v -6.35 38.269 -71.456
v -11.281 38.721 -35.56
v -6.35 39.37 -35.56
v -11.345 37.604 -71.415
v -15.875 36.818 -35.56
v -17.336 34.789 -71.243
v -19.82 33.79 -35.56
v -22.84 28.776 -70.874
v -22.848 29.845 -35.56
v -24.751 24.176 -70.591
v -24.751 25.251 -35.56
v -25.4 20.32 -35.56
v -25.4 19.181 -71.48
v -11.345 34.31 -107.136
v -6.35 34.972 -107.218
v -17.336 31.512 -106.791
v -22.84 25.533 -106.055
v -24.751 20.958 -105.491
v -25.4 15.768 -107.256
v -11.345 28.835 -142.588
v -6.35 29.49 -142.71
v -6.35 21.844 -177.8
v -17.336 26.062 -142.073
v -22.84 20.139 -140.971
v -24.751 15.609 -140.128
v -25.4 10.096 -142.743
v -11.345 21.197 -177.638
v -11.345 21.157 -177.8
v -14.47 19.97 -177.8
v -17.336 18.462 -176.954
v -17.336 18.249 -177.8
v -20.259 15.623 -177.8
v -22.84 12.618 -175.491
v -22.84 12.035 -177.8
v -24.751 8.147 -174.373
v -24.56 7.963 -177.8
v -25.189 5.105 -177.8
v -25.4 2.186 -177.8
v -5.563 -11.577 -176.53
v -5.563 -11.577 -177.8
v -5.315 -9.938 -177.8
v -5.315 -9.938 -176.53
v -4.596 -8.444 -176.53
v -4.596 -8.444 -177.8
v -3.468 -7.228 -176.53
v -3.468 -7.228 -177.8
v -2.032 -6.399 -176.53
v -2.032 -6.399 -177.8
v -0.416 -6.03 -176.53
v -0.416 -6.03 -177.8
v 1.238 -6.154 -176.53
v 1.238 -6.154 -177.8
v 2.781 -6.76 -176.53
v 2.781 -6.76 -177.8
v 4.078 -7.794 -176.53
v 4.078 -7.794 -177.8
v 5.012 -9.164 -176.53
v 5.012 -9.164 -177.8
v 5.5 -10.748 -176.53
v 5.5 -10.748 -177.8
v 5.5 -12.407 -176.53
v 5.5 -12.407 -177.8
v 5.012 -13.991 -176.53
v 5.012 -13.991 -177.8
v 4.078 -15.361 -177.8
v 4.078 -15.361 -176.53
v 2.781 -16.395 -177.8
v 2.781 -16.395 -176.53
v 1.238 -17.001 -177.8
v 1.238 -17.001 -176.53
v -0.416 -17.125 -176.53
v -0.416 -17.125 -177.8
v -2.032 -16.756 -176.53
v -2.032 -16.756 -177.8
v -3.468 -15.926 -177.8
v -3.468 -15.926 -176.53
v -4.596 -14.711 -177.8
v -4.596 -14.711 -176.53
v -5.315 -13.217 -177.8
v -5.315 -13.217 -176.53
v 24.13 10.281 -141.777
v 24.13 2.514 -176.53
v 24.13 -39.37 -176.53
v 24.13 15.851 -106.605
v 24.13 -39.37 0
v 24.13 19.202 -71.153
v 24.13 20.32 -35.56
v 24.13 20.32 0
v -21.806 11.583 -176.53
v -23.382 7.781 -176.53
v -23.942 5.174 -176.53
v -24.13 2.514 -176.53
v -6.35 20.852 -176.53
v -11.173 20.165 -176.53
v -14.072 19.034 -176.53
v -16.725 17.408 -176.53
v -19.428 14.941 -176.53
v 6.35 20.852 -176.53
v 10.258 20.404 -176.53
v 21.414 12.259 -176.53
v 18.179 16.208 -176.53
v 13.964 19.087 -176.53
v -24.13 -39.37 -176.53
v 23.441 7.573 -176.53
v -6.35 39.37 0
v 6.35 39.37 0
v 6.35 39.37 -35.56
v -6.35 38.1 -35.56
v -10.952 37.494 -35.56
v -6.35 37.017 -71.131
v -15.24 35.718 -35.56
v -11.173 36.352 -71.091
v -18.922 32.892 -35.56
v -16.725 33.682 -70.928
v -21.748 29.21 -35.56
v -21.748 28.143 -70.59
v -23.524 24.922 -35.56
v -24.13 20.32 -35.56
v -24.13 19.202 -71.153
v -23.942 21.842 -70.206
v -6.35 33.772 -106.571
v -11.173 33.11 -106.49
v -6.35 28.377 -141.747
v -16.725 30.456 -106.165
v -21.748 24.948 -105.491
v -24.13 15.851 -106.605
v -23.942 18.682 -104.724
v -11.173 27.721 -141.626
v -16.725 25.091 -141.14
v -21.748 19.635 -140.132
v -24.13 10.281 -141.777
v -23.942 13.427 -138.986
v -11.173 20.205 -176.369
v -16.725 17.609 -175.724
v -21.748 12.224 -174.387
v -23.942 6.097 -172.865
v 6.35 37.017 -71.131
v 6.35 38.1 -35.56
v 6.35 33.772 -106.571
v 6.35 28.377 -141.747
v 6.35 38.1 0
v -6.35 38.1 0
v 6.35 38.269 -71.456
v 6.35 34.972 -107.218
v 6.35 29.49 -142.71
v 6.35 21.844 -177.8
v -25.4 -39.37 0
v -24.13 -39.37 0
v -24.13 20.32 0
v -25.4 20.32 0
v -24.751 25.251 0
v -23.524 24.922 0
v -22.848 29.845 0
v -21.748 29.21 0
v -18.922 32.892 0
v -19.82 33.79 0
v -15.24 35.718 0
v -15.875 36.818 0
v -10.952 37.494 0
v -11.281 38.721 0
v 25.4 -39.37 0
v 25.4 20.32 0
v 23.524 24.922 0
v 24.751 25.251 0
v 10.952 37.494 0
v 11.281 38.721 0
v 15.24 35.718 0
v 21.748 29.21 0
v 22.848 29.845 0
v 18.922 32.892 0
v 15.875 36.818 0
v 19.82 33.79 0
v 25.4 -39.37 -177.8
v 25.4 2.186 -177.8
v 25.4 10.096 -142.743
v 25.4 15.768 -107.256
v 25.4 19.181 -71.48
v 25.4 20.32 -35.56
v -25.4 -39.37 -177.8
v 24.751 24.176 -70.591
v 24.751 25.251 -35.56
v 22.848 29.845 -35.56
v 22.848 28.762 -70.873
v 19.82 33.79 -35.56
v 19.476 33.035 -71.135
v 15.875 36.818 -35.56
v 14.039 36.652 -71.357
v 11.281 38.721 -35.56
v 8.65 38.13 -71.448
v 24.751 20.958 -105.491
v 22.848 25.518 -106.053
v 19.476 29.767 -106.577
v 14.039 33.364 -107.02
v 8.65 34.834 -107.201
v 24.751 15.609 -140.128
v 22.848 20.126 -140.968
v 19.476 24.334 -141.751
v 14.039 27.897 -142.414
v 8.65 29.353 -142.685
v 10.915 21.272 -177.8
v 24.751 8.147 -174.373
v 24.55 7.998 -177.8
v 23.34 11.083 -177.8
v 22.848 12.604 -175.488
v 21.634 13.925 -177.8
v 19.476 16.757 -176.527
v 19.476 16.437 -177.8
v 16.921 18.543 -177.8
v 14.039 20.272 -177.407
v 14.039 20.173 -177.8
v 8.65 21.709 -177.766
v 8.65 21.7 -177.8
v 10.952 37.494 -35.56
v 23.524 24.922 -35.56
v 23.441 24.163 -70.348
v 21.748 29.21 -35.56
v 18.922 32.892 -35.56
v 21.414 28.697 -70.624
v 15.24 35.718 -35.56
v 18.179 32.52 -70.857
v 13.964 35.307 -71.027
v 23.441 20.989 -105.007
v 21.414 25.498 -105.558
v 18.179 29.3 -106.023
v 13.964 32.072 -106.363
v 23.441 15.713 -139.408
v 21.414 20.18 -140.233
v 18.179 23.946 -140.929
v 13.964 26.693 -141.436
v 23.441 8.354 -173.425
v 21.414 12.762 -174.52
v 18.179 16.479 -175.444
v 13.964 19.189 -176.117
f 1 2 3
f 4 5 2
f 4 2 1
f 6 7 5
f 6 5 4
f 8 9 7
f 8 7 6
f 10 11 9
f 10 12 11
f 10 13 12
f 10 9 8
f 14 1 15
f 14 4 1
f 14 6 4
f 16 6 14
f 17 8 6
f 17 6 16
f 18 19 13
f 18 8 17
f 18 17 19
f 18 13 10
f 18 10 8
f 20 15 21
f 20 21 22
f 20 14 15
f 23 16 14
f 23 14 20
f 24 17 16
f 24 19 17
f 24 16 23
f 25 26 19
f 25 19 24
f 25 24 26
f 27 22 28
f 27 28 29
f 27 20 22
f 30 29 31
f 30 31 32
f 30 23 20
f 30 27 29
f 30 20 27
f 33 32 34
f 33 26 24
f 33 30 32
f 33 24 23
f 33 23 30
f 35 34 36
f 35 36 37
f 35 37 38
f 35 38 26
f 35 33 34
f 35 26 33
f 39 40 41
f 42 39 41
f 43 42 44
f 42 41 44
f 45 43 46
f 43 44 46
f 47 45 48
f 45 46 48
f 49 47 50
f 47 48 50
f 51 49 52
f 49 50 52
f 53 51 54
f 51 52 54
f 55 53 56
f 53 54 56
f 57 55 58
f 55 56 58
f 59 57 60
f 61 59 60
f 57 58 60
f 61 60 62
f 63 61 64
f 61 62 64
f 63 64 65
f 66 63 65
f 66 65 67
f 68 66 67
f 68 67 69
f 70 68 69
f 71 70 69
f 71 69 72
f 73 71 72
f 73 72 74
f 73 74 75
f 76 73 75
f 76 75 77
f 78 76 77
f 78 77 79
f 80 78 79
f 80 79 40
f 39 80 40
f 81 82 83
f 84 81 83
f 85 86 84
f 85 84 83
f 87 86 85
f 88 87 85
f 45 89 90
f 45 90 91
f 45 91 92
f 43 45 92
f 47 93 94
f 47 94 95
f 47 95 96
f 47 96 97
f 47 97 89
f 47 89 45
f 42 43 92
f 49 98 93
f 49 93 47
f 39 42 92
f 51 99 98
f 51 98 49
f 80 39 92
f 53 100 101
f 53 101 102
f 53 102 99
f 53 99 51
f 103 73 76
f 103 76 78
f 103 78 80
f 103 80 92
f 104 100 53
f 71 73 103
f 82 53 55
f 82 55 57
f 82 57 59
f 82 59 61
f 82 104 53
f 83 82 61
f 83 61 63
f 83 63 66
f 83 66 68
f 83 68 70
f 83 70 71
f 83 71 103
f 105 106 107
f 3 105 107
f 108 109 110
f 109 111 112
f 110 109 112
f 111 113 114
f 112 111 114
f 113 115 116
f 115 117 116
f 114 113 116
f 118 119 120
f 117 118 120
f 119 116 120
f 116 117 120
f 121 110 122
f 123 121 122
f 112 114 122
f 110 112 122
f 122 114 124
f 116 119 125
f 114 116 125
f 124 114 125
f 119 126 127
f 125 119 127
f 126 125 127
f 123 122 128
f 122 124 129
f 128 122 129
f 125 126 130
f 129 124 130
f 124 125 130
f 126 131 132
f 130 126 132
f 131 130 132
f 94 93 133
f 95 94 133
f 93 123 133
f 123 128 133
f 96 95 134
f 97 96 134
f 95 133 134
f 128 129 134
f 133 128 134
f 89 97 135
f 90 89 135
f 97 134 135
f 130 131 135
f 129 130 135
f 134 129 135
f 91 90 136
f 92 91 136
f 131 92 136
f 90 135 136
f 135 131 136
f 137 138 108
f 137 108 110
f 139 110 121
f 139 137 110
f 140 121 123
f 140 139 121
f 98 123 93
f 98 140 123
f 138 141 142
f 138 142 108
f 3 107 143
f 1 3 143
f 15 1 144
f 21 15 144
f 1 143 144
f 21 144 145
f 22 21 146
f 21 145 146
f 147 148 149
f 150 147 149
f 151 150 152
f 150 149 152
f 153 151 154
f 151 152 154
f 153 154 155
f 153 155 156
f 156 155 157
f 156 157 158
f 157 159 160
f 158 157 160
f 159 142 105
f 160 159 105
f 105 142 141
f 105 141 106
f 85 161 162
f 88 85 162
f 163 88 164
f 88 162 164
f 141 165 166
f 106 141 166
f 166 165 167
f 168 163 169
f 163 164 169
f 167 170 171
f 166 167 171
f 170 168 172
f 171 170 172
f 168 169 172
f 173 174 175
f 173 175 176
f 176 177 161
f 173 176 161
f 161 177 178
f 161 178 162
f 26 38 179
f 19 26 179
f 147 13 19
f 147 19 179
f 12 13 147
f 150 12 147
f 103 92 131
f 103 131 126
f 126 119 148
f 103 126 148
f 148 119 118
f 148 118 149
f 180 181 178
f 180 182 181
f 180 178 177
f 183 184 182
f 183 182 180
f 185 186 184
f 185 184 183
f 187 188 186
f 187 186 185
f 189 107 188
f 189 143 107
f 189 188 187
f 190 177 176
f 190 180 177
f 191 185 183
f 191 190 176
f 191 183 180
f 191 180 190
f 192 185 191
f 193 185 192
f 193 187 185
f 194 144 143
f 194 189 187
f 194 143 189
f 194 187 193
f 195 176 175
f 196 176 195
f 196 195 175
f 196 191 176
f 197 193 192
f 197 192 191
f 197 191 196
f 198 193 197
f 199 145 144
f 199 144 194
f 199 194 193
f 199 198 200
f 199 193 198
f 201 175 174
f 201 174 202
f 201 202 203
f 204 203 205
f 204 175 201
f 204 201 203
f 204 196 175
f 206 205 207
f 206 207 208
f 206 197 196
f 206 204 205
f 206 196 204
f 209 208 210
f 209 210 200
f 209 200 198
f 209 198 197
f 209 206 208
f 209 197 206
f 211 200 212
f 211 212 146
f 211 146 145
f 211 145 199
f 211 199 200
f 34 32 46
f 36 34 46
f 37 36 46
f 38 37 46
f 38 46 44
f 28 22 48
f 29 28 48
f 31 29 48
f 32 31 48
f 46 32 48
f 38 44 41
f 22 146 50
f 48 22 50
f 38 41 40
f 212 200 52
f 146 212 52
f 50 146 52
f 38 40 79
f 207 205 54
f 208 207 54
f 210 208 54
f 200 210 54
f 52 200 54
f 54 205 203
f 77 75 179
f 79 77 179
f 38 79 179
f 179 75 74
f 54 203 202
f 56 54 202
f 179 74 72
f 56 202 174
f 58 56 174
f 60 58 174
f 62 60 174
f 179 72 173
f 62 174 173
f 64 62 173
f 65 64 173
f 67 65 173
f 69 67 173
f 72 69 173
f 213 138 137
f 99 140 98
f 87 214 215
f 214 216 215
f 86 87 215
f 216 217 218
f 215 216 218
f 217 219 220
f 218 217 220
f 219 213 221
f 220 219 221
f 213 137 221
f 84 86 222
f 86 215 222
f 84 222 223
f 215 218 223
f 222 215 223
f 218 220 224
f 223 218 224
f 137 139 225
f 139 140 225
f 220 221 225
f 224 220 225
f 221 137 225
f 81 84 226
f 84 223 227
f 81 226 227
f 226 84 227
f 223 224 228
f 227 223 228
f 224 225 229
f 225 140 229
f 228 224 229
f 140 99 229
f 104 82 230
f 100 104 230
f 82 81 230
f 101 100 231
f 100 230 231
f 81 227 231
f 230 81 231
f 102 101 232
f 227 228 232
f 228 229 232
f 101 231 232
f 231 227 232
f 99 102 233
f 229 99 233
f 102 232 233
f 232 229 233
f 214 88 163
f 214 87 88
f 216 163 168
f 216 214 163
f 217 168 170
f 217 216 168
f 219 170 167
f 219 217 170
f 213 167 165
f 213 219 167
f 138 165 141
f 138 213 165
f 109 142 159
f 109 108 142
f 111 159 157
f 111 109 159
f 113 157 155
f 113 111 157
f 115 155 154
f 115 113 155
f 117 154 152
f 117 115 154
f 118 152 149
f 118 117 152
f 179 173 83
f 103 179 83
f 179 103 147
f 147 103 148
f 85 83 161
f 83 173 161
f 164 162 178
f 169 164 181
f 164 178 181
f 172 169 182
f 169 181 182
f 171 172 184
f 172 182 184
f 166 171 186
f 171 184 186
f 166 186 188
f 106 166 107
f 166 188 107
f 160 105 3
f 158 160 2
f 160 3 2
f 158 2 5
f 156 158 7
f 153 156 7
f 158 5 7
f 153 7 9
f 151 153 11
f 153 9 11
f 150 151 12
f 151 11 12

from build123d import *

# Parameters (mm, degrees)
BOSS_EXTRUDE1_DEPTH      = 25.4
BOSS_EXTRUDE1_DEPTH_BACK = 25.4
FILLET1_R                = 19.05
SHELL1_T                 = -1.27
SKETCH4_R                = 5.5626
CUT_EXTRUDE1_DEPTH       = 50.947471892


with BuildPart() as part:
    # Sketch3 → Boss-Extrude1 (new body, two sides)
    with BuildSketch(Plane(origin=(0, 0, 0), x_dir=(0, 0, -1), z_dir=(1, 0, 0))) as boss_extrude1_sk:
        with BuildLine():
            Line((0, 39.37), (35.56, 39.37))
            ThreePointArc((35.56, 39.37), (107.217829782, 34.971995328), (177.8, 21.844))
            Line((177.8, 21.844), (177.8, -39.37))
            Line((177.8, -39.37), (0, -39.37))
            Line((0, -39.37), (0, 39.37))
        make_face()
    extrude(amount=BOSS_EXTRUDE1_DEPTH)
    extrude(boss_extrude1_sk.sketch, amount=-BOSS_EXTRUDE1_DEPTH_BACK)

    # Fillet1
    fillet1_edges = [part.edges().sort_by_distance(p)[0] for p in [
        (25.4, 34.971995328, -107.217829782),
        (-25.4, 39.37, -17.78),
        (-25.4, 34.971995328, -107.217829782),
        (25.4, 39.37, -17.78),
    ]]
    fillet(fillet1_edges, radius=FILLET1_R)

    # Shell1
    shell1_openings = [part.faces().sort_by_distance(p)[0] for p in [
        (0, -39.37, -88.9),
        (0, 8.088461394, 0),
    ]]
    offset(amount=SHELL1_T, openings=shell1_openings, kind=Kind.INTERSECTION)

    # Sketch4 → Cut-Extrude1 (cut)
    with BuildSketch(Plane(origin=(0, 0, -177.8), x_dir=(-1, 0, 0), z_dir=(0, 0, -1))):
        with Locations((0, -11.577471892)):
            Circle(SKETCH4_R)
    extrude(amount=-CUT_EXTRUDE1_DEPTH, mode=Mode.SUBTRACT)


solid = part.part
